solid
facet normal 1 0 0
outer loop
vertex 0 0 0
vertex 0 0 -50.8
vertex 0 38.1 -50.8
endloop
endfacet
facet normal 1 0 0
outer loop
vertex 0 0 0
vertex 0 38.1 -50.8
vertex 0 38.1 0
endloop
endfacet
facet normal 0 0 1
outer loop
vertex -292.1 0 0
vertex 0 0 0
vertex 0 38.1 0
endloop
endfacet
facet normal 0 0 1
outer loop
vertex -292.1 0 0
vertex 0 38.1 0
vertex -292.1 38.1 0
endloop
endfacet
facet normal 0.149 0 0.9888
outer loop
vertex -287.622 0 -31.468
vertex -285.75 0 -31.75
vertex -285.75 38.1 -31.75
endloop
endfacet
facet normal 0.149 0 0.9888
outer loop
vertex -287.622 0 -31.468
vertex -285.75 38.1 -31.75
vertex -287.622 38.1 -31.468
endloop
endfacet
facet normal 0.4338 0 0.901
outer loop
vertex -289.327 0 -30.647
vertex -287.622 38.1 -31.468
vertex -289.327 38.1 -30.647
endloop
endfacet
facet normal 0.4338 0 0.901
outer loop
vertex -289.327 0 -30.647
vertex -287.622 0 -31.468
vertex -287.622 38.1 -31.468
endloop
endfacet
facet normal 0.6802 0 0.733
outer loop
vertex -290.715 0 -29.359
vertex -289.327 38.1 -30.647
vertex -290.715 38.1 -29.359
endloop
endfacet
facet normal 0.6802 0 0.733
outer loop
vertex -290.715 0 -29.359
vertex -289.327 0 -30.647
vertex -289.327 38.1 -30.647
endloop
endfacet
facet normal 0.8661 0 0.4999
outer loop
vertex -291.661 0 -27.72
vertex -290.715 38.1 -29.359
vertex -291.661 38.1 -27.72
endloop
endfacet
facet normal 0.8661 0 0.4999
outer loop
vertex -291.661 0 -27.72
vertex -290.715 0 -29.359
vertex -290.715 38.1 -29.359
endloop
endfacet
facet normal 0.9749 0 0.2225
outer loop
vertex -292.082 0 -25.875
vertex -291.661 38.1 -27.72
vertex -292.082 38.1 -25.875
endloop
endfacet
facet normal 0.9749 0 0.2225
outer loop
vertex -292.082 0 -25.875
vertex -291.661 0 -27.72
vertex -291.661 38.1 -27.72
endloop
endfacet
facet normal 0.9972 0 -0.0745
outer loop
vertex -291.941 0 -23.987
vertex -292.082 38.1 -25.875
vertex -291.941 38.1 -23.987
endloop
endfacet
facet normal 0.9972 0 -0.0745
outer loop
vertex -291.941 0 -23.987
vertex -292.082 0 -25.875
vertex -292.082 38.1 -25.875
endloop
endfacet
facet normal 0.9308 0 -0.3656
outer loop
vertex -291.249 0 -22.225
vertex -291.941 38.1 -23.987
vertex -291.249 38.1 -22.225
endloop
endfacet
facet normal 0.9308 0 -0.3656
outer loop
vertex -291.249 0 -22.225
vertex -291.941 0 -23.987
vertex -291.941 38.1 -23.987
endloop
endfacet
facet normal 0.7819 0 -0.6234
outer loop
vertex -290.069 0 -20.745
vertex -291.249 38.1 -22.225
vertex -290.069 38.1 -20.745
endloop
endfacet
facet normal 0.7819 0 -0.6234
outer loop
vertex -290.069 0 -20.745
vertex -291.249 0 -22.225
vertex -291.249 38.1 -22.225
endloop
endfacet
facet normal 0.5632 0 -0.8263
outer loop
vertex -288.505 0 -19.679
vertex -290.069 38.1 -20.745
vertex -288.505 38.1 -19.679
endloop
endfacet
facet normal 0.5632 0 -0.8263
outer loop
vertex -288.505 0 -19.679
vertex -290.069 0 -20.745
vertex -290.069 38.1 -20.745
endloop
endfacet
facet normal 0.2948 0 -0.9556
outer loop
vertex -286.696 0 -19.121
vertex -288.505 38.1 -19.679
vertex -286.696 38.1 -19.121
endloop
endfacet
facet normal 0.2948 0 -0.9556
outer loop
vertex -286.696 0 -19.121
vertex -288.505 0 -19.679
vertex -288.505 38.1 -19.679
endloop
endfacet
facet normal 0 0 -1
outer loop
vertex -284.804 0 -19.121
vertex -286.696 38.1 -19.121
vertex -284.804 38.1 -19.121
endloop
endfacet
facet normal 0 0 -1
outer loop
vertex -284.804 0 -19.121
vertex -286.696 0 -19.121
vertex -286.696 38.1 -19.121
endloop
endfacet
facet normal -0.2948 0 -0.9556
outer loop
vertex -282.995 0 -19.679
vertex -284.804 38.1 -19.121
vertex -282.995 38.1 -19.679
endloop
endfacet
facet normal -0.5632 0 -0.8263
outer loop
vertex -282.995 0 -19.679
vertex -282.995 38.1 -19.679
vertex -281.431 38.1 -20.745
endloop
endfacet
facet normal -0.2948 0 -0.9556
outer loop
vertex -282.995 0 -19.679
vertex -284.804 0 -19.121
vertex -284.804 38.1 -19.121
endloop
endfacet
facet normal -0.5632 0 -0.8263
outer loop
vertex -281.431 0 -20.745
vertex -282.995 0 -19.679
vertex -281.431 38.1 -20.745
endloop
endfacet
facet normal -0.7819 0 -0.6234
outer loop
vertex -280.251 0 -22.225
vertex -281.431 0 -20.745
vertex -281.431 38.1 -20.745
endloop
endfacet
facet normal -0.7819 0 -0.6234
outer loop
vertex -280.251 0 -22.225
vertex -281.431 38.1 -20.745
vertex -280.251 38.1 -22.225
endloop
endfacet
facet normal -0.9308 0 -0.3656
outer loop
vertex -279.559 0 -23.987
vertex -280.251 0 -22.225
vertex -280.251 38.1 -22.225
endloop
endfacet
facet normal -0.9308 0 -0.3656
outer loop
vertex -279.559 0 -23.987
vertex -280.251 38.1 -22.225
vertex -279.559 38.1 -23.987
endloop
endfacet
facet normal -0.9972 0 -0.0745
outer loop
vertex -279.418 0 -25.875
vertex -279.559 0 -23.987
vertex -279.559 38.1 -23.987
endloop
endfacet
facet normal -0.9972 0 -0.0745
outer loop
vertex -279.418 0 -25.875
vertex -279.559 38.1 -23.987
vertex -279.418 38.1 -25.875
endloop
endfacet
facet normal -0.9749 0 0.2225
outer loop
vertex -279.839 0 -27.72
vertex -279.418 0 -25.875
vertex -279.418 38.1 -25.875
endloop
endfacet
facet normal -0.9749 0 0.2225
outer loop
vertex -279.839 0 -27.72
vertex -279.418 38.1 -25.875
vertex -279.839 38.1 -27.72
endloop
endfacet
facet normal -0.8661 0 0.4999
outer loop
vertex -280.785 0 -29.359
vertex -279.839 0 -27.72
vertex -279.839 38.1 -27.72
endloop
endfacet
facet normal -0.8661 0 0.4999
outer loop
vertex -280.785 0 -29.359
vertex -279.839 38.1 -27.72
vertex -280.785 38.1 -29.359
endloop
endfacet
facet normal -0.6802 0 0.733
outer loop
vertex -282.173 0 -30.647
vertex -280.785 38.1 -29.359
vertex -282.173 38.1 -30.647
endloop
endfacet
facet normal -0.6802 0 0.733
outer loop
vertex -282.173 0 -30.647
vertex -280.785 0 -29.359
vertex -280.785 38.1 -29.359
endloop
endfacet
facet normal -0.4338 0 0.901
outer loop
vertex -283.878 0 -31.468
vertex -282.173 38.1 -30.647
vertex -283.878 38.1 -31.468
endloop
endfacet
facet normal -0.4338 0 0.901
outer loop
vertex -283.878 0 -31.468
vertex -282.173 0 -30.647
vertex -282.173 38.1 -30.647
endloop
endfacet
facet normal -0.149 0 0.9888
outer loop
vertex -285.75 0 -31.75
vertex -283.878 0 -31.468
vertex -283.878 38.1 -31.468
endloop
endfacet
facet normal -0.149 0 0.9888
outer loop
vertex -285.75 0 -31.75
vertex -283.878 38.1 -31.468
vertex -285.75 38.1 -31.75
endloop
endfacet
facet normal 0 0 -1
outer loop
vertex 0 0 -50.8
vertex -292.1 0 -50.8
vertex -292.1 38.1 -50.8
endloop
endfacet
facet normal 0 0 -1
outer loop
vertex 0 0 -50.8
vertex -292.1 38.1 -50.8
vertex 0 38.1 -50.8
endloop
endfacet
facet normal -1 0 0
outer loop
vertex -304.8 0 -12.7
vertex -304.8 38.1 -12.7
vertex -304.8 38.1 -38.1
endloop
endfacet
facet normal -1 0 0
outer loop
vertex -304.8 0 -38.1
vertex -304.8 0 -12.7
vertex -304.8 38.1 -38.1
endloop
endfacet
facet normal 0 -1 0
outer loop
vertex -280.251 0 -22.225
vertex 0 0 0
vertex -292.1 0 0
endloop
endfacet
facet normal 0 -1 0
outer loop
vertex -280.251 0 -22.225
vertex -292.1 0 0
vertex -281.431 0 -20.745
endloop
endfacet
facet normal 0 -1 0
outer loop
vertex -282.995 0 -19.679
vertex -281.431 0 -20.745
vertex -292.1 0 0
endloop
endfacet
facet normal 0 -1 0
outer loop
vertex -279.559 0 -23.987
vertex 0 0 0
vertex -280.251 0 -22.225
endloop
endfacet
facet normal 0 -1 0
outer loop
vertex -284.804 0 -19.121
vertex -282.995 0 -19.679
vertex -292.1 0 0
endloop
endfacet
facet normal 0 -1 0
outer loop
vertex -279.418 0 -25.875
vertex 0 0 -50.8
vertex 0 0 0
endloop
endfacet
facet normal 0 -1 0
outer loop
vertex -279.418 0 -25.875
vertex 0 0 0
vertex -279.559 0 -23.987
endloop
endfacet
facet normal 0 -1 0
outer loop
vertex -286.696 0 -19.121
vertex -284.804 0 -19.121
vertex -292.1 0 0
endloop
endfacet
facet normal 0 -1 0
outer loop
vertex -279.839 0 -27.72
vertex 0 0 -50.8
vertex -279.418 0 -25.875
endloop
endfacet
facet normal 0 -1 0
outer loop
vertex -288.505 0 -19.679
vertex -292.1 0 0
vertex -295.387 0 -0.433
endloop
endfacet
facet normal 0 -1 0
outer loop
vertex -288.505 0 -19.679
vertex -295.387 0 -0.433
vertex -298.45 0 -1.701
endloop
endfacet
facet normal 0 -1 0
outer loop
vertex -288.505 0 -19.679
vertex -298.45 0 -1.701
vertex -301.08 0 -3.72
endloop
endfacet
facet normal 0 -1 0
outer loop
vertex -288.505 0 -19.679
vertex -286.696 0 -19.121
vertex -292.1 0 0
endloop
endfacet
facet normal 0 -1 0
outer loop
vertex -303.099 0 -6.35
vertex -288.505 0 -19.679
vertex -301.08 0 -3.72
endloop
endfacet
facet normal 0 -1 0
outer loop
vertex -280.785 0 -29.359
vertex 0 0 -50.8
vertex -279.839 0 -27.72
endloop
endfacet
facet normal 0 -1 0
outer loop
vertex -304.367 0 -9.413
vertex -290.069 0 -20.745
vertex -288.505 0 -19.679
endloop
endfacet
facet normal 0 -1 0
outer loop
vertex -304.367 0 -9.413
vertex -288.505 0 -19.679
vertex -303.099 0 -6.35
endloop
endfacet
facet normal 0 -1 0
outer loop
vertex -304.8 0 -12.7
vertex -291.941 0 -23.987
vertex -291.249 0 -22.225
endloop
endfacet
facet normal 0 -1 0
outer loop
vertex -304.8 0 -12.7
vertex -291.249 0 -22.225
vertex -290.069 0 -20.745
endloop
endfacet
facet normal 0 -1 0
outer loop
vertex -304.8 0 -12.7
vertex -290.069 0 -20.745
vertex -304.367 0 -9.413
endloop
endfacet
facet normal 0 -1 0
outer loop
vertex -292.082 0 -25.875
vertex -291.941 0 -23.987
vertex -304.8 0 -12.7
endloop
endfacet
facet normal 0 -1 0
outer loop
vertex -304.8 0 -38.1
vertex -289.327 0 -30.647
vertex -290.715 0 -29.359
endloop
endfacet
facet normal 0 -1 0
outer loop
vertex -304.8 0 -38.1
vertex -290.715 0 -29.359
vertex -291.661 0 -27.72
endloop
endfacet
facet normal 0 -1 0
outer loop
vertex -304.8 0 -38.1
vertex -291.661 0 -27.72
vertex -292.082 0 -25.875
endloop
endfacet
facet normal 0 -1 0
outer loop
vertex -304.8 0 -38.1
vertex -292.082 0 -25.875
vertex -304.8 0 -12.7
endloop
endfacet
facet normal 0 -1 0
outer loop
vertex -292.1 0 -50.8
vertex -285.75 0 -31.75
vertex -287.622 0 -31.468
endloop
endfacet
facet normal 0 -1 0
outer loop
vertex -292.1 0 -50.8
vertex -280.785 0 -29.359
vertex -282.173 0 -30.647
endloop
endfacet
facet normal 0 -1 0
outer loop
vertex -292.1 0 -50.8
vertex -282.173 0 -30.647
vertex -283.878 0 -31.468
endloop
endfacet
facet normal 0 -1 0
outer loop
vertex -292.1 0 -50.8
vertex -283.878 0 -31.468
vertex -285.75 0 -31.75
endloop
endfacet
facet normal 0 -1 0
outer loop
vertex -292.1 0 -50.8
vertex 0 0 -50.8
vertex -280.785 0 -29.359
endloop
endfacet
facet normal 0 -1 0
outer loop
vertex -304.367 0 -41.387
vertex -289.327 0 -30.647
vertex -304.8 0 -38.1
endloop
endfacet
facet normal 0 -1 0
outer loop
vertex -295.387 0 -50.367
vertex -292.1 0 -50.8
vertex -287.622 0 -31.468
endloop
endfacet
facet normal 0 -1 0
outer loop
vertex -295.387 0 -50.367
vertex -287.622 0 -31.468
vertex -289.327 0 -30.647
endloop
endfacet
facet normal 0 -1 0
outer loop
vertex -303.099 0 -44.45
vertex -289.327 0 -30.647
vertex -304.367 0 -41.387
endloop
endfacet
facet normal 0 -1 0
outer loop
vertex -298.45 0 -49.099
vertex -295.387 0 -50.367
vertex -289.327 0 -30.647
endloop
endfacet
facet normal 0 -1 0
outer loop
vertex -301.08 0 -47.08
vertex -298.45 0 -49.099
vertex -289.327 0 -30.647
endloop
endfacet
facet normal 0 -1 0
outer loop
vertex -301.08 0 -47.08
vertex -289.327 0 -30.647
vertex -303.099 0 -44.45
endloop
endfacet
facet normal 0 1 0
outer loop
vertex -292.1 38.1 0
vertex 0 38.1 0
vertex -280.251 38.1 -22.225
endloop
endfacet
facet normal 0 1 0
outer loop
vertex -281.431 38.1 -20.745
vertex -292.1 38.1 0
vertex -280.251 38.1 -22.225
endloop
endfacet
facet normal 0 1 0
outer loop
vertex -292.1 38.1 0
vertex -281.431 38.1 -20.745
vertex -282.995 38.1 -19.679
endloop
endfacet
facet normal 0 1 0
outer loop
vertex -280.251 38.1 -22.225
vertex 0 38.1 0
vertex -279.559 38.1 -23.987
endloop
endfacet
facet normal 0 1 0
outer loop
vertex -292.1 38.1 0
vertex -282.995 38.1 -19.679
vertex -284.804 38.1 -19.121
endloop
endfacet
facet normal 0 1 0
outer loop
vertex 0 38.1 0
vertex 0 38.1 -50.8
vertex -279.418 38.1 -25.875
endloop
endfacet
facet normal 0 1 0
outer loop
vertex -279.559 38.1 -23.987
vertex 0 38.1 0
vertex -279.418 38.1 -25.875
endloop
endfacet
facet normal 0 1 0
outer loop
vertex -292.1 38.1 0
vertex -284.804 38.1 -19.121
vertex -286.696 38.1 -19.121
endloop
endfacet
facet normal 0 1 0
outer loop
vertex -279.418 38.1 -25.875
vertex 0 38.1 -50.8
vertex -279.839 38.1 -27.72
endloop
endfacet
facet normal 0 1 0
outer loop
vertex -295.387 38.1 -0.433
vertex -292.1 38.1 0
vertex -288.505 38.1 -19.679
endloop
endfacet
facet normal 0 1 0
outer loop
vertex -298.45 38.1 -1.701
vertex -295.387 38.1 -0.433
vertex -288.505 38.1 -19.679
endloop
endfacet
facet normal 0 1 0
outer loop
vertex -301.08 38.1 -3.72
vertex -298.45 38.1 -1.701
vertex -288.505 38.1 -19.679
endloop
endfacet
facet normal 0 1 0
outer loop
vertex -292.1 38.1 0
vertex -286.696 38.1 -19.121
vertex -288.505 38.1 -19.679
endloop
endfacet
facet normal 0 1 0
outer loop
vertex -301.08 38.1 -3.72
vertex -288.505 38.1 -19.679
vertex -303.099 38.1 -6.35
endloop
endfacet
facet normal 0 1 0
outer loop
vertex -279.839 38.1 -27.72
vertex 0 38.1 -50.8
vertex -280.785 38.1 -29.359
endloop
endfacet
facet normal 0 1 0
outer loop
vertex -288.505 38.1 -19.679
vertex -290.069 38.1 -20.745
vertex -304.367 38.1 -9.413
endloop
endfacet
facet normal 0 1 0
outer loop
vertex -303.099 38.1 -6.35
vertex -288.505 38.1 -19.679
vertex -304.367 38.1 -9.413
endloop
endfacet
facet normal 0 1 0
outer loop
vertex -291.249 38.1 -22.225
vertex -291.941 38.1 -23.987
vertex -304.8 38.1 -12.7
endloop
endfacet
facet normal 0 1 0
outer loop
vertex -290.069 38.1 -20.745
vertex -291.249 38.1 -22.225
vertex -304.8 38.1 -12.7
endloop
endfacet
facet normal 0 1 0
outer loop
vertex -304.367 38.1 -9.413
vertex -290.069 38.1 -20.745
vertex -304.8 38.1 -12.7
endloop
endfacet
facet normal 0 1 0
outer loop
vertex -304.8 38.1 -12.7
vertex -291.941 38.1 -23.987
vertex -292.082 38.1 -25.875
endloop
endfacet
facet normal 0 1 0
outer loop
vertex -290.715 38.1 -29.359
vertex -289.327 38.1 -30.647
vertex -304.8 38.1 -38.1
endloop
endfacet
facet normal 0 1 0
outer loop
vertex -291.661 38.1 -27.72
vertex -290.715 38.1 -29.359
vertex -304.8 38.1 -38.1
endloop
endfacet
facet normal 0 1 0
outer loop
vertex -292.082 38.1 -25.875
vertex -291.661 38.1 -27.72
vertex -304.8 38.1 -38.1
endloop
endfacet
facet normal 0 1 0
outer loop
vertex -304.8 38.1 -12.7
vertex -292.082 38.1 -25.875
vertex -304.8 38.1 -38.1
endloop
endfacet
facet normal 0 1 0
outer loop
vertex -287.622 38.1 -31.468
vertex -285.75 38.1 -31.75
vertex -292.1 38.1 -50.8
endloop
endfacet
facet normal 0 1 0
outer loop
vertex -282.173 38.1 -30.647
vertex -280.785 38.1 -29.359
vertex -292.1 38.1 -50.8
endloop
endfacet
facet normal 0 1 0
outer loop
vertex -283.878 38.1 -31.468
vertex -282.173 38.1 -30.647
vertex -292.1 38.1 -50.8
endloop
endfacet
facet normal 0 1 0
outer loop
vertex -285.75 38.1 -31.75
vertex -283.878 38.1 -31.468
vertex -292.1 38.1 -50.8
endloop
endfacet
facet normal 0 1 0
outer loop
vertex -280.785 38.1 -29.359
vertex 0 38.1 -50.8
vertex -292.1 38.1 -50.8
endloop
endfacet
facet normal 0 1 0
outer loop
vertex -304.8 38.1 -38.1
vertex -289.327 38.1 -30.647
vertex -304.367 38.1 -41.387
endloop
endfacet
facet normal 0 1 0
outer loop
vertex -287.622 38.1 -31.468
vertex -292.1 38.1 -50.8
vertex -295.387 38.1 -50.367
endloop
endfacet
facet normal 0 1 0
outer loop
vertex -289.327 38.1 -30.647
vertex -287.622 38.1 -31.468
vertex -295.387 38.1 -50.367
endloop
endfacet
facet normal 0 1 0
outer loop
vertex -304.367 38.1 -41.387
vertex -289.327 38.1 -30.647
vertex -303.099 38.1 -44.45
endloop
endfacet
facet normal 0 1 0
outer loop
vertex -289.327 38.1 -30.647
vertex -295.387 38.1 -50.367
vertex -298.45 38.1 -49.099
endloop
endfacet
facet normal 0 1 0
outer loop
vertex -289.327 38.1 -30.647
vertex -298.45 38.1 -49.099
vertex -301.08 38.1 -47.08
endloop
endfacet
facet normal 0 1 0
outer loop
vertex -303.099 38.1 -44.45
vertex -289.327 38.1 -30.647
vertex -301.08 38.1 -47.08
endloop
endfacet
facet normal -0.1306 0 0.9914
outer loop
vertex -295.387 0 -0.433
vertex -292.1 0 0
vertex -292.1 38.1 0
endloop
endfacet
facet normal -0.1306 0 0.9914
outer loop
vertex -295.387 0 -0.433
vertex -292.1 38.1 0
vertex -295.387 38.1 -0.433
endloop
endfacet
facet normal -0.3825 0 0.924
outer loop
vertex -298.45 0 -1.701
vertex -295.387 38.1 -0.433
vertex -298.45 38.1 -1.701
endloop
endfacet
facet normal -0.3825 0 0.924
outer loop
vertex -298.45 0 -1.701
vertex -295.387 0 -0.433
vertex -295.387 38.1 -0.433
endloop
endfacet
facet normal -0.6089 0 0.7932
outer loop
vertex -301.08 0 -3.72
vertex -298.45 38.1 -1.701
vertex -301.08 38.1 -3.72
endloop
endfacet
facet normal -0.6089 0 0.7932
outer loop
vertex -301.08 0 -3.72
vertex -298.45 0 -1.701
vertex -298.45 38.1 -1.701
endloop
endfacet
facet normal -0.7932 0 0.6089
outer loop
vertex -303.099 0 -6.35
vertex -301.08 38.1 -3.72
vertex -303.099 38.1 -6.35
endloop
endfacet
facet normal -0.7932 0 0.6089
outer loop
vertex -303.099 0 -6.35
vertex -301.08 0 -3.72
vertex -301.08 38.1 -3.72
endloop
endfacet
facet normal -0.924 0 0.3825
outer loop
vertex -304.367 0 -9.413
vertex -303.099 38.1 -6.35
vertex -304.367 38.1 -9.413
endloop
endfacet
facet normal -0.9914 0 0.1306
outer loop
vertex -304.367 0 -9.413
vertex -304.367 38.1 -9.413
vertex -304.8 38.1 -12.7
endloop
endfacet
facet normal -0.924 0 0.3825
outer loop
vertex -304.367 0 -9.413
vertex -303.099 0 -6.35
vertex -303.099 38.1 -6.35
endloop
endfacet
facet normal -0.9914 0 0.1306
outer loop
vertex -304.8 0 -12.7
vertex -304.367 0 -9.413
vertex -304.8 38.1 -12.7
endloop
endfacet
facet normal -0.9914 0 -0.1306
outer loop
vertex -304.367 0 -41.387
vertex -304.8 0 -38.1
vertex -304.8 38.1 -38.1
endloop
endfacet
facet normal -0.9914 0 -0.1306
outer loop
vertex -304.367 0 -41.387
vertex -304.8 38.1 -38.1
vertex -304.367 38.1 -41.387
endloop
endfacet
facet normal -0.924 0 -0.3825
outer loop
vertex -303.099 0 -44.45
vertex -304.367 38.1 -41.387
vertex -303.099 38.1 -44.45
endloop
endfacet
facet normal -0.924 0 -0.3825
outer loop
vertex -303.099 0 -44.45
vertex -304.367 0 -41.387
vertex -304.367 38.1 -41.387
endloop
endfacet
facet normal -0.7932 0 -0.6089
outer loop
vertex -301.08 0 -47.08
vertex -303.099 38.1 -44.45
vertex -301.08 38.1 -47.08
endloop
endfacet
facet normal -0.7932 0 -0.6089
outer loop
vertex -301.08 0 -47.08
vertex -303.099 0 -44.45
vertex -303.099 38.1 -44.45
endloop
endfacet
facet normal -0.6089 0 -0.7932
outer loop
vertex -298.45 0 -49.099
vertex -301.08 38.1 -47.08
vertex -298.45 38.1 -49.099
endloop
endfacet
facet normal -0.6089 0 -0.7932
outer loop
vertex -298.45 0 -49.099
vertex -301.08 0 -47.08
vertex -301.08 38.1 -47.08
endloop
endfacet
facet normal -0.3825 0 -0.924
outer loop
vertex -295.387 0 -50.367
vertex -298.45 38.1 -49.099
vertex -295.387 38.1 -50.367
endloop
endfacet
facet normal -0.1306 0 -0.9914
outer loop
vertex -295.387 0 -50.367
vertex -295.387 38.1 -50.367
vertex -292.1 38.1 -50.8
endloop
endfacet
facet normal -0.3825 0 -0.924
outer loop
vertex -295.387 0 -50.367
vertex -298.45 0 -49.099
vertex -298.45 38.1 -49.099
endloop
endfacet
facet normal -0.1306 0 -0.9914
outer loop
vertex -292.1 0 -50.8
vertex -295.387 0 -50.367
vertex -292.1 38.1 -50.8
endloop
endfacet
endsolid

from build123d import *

# Parameters (mm, degrees)
SKETCH1_R           = 6.35
BOSS_EXTRUDE1_DEPTH = 38.1


with BuildPart() as part:
    # Sketch1 → Boss-Extrude1 (new body)
    with BuildSketch(Plane(origin=(0, 0, 0), x_dir=(1, 0, 0), z_dir=(0, 1, 0))):
        with BuildLine():
            Line((0, 0), (-292.1, 0))
            ThreePointArc((-292.1, 0), (-301.080256121, 3.719743879), (-304.8, 12.7))
            Line((-304.8, 12.7), (-304.8, 38.1))
            ThreePointArc((-304.8, 38.1), (-301.080256121, 47.080256121), (-292.1, 50.8))
            Line((-292.1, 50.8), (0, 50.8))
            Line((0, 50.8), (0, 0))
        make_face()
        with Locations(Location((-285.75, 25.4, 0), (0, 0, 90))):
            Circle(SKETCH1_R, mode=Mode.SUBTRACT)
    extrude(amount=BOSS_EXTRUDE1_DEPTH)


solid = part.part
